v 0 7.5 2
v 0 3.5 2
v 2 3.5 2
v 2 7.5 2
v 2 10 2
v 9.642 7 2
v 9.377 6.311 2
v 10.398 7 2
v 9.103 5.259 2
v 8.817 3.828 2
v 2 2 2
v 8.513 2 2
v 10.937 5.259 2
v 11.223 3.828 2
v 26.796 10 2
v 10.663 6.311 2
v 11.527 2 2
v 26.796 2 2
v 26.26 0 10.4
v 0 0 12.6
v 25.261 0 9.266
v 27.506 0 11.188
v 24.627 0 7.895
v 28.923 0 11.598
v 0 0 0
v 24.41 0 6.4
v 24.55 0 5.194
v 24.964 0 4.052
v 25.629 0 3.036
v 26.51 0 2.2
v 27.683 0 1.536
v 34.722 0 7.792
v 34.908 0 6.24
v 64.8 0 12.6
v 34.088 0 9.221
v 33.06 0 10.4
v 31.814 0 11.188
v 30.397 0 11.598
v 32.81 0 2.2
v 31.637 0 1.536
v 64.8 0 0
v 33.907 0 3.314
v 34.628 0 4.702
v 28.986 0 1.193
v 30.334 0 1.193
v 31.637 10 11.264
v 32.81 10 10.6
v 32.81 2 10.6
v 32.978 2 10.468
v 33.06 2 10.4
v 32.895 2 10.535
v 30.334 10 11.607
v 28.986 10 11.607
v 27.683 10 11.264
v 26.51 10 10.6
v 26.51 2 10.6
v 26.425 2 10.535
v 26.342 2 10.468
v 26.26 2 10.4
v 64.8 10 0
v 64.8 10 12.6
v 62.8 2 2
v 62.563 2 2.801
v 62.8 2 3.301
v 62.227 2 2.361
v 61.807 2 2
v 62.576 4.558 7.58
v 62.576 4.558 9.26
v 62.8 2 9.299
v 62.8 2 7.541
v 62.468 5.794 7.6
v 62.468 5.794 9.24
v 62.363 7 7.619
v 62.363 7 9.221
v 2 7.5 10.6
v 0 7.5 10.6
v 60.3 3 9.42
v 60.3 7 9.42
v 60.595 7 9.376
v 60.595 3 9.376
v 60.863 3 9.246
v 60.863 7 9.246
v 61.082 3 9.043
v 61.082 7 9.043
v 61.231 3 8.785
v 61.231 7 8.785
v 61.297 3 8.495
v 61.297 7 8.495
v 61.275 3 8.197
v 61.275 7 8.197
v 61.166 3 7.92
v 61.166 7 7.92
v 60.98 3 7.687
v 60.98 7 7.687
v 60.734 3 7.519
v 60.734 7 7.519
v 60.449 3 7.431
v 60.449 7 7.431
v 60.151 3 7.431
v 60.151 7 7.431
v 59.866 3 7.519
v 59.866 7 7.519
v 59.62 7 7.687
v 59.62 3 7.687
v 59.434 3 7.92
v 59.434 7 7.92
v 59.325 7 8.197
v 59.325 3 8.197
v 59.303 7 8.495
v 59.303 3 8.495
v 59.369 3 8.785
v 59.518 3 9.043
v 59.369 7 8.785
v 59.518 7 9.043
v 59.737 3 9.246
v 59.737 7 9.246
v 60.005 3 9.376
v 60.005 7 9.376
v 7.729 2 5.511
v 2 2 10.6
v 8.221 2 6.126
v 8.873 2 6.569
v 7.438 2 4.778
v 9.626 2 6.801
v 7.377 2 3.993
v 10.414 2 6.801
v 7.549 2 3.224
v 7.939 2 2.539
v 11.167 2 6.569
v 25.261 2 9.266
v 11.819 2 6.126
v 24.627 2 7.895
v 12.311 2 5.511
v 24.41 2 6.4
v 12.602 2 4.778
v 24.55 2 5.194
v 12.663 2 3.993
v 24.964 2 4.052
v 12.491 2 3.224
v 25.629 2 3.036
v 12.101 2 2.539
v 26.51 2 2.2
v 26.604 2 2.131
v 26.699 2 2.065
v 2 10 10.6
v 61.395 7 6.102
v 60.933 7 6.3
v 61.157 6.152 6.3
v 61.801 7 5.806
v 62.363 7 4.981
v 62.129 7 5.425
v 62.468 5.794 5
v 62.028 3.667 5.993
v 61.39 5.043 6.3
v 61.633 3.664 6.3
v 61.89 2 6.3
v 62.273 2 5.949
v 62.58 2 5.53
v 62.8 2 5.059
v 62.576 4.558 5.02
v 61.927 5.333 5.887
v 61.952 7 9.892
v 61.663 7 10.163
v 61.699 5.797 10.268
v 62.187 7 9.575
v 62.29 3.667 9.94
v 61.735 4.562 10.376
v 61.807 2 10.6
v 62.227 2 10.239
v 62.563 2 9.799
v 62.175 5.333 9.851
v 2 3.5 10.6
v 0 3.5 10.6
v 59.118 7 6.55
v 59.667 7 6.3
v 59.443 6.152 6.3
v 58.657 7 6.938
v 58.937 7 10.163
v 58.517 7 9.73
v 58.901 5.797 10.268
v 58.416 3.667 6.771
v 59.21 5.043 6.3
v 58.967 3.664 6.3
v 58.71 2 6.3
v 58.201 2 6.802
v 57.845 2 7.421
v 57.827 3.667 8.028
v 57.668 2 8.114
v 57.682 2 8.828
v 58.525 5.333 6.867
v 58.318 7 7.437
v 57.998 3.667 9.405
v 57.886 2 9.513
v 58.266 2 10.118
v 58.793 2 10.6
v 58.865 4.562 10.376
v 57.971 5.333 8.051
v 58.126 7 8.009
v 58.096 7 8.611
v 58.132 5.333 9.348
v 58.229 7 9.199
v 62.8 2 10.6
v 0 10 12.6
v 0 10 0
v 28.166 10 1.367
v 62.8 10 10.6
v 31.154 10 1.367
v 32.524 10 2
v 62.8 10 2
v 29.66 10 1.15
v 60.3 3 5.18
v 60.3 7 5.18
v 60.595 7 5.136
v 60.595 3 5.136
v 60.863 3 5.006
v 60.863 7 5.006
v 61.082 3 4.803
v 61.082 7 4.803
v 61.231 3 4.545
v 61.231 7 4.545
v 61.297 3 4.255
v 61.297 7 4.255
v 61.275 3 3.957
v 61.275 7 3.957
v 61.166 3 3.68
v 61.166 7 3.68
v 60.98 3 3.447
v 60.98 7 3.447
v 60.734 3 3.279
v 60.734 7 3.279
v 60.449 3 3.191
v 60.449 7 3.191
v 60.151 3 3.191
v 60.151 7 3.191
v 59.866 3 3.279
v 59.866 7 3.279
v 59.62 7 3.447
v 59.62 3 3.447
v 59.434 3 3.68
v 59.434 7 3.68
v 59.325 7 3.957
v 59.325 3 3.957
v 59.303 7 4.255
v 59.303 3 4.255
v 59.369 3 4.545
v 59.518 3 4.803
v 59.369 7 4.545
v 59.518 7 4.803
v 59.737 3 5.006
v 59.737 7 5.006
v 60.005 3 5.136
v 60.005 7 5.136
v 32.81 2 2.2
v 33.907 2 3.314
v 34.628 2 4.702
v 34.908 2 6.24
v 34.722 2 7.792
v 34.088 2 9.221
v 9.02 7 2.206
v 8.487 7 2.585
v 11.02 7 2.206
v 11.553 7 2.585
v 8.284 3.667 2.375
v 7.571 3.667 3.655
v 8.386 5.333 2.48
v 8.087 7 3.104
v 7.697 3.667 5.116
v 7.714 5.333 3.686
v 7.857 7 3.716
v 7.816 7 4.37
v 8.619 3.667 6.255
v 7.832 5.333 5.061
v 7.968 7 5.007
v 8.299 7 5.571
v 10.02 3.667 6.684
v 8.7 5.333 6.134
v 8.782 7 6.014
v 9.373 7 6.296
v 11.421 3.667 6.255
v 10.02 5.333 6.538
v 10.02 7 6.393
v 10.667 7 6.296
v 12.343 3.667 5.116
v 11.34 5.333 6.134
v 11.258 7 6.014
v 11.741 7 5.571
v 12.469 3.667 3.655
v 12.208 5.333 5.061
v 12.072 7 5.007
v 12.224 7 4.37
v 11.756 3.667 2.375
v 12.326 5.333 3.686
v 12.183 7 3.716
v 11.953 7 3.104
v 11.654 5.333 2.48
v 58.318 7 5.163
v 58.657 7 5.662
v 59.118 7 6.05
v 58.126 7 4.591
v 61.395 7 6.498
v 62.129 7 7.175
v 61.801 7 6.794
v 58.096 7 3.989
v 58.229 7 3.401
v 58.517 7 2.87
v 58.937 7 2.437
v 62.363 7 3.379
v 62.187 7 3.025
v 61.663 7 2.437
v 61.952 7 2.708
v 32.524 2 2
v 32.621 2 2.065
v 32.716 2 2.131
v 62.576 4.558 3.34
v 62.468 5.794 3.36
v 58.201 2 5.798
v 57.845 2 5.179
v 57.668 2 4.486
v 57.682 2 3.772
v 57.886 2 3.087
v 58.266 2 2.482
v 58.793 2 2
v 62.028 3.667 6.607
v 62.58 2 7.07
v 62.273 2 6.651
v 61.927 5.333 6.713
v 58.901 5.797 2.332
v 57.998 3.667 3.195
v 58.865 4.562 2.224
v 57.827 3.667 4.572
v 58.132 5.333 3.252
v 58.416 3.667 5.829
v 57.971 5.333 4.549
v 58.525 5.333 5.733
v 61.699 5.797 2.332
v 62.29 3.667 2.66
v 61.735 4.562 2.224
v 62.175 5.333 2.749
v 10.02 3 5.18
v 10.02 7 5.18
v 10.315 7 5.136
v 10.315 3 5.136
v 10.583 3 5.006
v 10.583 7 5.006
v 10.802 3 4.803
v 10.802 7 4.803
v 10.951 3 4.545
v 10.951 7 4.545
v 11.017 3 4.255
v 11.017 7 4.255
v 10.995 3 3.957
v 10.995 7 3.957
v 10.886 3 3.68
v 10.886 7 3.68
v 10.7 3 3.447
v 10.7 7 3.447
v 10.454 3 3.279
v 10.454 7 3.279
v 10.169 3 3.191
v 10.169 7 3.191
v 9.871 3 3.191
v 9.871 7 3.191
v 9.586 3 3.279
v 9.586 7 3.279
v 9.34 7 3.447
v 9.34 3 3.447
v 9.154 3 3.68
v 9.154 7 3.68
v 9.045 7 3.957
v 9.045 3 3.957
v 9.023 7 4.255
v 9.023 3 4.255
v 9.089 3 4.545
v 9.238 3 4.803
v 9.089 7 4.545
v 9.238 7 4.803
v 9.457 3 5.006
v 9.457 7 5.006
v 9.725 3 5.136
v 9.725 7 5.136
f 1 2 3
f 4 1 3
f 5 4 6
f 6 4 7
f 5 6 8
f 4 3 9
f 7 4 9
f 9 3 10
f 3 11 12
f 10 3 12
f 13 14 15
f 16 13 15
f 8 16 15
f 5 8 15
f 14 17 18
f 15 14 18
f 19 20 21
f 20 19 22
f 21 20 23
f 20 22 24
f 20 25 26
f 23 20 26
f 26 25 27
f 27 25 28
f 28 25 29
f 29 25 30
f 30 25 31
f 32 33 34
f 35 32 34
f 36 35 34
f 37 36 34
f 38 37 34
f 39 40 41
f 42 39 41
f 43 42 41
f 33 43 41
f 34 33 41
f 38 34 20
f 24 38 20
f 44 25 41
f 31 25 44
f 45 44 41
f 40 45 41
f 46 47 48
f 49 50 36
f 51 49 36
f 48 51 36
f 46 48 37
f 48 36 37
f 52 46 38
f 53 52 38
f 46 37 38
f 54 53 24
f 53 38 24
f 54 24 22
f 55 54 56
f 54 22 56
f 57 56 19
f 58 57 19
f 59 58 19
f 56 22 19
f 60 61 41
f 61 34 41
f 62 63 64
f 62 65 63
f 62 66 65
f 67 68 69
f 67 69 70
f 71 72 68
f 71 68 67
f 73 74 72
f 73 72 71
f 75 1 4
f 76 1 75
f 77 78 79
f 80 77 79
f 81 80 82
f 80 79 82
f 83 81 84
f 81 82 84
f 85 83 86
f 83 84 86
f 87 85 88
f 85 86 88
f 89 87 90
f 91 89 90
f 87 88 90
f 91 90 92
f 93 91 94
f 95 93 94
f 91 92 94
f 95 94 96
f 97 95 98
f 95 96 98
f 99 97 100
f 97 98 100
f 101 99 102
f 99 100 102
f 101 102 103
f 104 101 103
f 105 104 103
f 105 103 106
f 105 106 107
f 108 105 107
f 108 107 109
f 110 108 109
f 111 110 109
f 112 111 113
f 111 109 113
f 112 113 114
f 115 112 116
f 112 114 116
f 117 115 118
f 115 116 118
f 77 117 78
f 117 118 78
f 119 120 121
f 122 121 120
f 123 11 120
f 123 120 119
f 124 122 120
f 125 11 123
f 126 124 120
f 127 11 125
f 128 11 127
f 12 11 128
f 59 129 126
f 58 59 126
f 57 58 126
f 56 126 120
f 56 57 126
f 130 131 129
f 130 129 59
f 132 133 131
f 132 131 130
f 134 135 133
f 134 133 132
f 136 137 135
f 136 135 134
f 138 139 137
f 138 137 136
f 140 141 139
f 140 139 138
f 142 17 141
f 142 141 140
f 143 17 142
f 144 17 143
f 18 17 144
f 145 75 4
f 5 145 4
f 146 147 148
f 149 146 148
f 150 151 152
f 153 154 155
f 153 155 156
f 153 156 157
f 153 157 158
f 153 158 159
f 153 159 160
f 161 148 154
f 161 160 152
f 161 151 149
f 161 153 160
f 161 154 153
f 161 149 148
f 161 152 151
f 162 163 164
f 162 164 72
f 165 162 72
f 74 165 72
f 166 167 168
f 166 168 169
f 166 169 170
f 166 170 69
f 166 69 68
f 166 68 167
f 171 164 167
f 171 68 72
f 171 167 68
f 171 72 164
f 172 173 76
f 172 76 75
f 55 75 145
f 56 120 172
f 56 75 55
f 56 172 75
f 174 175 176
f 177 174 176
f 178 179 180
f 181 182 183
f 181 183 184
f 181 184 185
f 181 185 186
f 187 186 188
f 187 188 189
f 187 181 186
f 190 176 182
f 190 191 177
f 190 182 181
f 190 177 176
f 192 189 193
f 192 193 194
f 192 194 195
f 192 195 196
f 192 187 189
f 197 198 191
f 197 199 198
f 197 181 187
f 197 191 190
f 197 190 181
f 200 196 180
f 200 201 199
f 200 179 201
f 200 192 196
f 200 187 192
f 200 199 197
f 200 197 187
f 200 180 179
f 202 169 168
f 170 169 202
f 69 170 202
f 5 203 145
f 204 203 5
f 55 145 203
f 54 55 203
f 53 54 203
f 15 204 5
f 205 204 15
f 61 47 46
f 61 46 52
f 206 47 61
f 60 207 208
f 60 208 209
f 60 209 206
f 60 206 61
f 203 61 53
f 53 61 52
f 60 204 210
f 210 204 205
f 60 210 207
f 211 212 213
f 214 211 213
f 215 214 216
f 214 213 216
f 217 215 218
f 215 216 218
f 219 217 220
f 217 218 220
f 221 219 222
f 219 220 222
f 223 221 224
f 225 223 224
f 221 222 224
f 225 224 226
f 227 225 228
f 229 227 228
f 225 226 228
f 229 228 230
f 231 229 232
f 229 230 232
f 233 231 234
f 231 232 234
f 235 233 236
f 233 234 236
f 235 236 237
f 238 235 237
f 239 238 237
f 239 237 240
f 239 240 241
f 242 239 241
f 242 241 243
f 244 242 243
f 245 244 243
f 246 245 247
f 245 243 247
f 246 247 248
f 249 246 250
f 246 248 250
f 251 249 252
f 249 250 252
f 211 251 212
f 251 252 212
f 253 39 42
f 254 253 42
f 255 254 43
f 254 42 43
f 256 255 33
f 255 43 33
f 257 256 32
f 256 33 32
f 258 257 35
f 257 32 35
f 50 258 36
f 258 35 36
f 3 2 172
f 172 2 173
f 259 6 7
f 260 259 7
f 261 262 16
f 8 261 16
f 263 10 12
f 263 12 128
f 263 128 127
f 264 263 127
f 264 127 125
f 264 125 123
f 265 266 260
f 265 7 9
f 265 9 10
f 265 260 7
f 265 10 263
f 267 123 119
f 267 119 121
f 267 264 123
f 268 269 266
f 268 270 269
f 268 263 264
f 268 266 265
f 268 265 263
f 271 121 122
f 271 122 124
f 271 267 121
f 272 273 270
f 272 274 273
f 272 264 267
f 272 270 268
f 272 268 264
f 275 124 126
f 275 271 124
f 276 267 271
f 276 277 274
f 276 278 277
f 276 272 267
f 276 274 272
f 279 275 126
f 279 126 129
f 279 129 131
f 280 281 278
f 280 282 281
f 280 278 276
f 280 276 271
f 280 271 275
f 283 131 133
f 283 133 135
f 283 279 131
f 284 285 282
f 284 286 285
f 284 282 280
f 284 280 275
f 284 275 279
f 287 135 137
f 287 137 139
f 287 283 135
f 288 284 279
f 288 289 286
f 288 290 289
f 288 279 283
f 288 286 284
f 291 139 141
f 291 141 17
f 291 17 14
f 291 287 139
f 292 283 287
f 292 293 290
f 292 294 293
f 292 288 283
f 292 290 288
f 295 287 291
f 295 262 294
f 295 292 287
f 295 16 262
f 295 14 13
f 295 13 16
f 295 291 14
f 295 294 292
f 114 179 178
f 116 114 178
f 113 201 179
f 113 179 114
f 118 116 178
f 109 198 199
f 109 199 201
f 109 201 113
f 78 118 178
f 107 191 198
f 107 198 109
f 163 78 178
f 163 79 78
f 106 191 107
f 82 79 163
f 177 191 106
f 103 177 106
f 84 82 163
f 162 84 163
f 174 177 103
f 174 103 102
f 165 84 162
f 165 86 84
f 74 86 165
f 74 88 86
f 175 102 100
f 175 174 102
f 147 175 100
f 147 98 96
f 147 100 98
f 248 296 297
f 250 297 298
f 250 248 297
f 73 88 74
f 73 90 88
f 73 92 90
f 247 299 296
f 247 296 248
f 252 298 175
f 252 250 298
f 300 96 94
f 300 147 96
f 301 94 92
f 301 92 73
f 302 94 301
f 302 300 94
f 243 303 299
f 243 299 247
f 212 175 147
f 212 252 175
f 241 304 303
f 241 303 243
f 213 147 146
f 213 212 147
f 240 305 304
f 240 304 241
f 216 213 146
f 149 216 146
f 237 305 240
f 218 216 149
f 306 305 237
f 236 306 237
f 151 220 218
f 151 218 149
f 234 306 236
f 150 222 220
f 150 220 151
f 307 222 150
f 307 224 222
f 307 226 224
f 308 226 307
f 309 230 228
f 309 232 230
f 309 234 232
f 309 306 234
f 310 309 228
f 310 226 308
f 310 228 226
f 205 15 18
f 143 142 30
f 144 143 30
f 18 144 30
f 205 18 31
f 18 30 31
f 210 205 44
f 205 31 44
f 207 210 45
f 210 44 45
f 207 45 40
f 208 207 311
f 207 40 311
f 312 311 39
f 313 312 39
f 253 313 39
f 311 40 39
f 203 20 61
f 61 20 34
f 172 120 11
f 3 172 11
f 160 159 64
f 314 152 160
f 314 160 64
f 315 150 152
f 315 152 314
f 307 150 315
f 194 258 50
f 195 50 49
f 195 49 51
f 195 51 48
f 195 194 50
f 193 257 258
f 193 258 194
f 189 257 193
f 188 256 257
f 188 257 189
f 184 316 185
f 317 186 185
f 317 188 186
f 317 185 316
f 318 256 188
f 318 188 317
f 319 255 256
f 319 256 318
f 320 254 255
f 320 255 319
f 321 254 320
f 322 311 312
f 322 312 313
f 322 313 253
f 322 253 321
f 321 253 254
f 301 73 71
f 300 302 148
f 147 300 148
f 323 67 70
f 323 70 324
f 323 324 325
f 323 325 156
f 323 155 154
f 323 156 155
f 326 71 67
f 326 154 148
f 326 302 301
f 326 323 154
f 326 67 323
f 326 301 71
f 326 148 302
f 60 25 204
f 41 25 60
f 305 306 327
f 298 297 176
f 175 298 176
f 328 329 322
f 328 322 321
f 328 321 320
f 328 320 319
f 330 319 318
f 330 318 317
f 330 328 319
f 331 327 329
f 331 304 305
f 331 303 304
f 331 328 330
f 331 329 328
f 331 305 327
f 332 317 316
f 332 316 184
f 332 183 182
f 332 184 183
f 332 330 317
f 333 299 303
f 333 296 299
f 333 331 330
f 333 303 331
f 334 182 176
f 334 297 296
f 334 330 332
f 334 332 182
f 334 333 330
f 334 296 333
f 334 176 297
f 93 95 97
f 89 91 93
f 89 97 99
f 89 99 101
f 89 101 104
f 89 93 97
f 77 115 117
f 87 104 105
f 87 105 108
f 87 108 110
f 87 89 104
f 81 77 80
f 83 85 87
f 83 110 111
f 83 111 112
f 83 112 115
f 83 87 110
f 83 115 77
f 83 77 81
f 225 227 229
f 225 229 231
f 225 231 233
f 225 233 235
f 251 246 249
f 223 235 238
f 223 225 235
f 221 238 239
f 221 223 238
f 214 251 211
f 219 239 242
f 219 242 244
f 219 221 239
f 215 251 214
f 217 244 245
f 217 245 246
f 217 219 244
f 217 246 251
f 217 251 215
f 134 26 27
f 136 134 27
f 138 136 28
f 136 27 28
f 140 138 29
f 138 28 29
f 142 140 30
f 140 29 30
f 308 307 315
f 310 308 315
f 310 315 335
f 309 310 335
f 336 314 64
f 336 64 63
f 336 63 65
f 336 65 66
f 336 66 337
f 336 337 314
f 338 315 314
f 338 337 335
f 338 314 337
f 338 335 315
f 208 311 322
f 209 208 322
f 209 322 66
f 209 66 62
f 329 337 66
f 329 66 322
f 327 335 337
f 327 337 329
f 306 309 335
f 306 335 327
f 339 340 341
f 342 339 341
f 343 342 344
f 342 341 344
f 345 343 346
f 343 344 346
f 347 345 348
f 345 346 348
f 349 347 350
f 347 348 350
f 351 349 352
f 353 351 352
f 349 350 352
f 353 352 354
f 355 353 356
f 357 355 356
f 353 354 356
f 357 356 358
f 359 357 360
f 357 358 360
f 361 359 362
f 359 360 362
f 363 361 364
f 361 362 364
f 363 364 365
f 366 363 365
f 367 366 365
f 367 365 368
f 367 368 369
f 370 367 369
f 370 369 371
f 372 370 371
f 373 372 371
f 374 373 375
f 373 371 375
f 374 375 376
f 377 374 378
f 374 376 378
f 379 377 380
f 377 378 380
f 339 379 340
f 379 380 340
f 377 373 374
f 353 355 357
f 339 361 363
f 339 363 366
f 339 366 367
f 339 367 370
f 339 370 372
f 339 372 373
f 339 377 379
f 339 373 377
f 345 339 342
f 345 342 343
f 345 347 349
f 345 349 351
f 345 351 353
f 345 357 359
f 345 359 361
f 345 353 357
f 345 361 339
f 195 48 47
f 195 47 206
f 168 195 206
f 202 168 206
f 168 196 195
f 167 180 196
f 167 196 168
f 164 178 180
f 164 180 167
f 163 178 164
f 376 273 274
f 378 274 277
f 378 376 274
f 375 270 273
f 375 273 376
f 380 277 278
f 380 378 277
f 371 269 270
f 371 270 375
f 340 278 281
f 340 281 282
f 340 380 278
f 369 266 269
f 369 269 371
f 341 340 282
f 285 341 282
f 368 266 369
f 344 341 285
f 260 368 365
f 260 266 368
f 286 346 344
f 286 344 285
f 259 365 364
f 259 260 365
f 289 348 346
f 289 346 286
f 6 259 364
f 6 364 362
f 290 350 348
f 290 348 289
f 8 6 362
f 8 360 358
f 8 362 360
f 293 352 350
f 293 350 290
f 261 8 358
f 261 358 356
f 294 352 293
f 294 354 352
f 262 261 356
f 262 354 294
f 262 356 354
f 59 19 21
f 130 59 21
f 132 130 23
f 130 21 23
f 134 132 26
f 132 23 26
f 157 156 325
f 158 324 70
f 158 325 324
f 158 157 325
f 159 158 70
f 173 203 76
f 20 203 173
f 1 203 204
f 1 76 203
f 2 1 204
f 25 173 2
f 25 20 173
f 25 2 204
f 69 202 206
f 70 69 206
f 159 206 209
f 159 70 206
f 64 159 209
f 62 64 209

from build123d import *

# Parameters (mm, degrees)
SKETCH1_W                     = 64.8
SKETCH1_H                     = 12.6
BOSS_EXTRUDE1_DEPTH           = 2
SKETCH2_W                     = 64.8
SKETCH2_H                     = 12.6
SKETCH2_W_2                   = 60.8
SKETCH2_H_2                   = 8.6
BOSS_EXTRUDE2_DEPTH           = 8
SKETCH3_R                     = 5.25
CUT_EXTRUDE1_DEPTH            = 67.766758196
BOSS_EXTRUDE3_DEPTH           = 5
BOSS_EXTRUDE3_DRAFT           = 5
SKETCH4_R                     = 2.65
BOSS_EXTRUDE3_PROFILE_2_DEPTH = 5
BOSS_EXTRUDE3_PROFILE_2_DRAFT = 5
SKETCH5_R                     = 1
CUT_EXTRUDE2_DEPTH            = 4
SKETCH6_W                     = 8.6
SKETCH6_H                     = 4
CUT_EXTRUDE3_DEPTH            = 3


with BuildPart() as part:
    # Sketch1 → Boss-Extrude1 (new body)
    with BuildSketch(Plane(origin=(0, 0, 0), x_dir=(1, 0, 0), z_dir=(0, 1, 0))):
        with Locations((32.4, -6.3)):
            Rectangle(SKETCH1_W, SKETCH1_H)
    extrude(amount=BOSS_EXTRUDE1_DEPTH)

    # Sketch2 → Boss-Extrude2 (add)
    with BuildSketch(Plane(origin=(0, 2, 0), x_dir=(1, 0, 0), z_dir=(0, 1, 0))):
        with Locations((32.4, -6.3)):
            Rectangle(SKETCH2_W, SKETCH2_H)
        with Locations((32.4, -6.3)):
            Rectangle(SKETCH2_W_2, SKETCH2_H_2, mode=Mode.SUBTRACT)
    extrude(amount=BOSS_EXTRUDE2_DEPTH)

    # Sketch3 → Cut-Extrude1 (cut, through all)
    with BuildSketch(Plane(origin=(0, 0, 0), x_dir=(-1, 0, 0), z_dir=(0, -1, 0))):
        with Locations((-29.66, -6.4)):
            Circle(SKETCH3_R)
    extrude(amount=-CUT_EXTRUDE1_DEPTH, mode=Mode.SUBTRACT)


with BuildPart() as boss_extrude3_tool:
    # Sketch4 → Boss-Extrude3 (with draft: the straight prism first)
    with BuildSketch(Plane(origin=(0, 2, 0), x_dir=(1, 0, 0), z_dir=(0, 1, 0))):
        with BuildLine():
            Line((62.8, -5.058919792), (62.8, -3.301080208))
            ThreePointArc((62.8, -3.301080208), (62.406319968, -2.571921583), (61.806685103, -2))
            Line((61.806685103, -2), (58.793314897, -2))
            ThreePointArc((58.793314897, -2), (57.650497281, -4.128664408), (58.71, -6.3))
            ThreePointArc((58.71, -6.3), (57.650497281, -8.471335592), (58.793314897, -10.6))
            Line((58.793314897, -10.6), (61.806685103, -10.6))
            ThreePointArc((61.806685103, -10.6), (62.406319968, -10.028078417), (62.8, -9.298919792))
            Line((62.8, -9.298919792), (62.8, -7.541080208))
            ThreePointArc((62.8, -7.541080208), (62.437076279, -6.85302681), (61.89, -6.3))
            ThreePointArc((61.89, -6.3), (62.437076279, -5.74697319), (62.8, -5.058919792))
        make_face()
    extrude(amount=BOSS_EXTRUDE3_DEPTH)
    # Boss-Extrude3: the draft: its side faces are tilted about the plane it starts from
    boss_extrude3_sides = [boss_extrude3_tool.faces().sort_by_distance(p)[0] for p in [
        (60.3, 4.5, 10.6),
        (62.406319968, 4.5, 10.028078417),
        (62.8, 4.5, 8.42),
        (62.437076279, 4.5, 6.85302681),
        (62.437076279, 4.5, 5.74697319),
        (62.8, 4.5, 4.18),
        (62.406319968, 4.5, 2.571921583),
        (60.3, 4.5, 2),
        (57.650497281, 4.5, 4.128664408),
        (57.650497281, 4.5, 8.471335592),
    ]]
    draft(boss_extrude3_sides, Plane(origin=(0, 2, 0), x_dir=(1, 0, 0), z_dir=(0, 1, 0)), BOSS_EXTRUDE3_DRAFT)


with BuildPart() as part_1:
    add(part.part)

    # Boss-Extrude3: add boss_extrude3_tool
    add(boss_extrude3_tool.part)


with BuildPart() as boss_extrude3_profile_2_tool:
    # Sketch4 → Boss-Extrude3 profile 2 (with draft: the straight prism first)
    with BuildSketch(Plane(origin=(0, 2, 0), x_dir=(1, 0, 0), z_dir=(0, 1, 0))):
        with Locations((10.02, -4.18)):
            Circle(SKETCH4_R)
    extrude(amount=BOSS_EXTRUDE3_PROFILE_2_DEPTH)
    # Boss-Extrude3 profile 2: the draft: its side faces are tilted about the plane it starts from
    boss_extrude3_profile_2_sides = [boss_extrude3_profile_2_tool.faces().sort_by_distance(p)[0] for p in [
        (7.37, 4.5, 4.18),
    ]]
    draft(boss_extrude3_profile_2_sides, Plane(origin=(0, 2, 0), x_dir=(1, 0, 0), z_dir=(0, 1, 0)), BOSS_EXTRUDE3_PROFILE_2_DRAFT)


with BuildPart() as part_2:
    add(part_1.part)

    # Boss-Extrude3 profile 2: add boss_extrude3_profile_2_tool
    add(boss_extrude3_profile_2_tool.part)

    # Sketch5 → Cut-Extrude2 (cut)
    with BuildSketch(Plane(origin=(0, 7, 0), x_dir=(1, 0, 0), z_dir=(0, 1, 0))):
        with Locations((60.3, -8.42)):
            Circle(SKETCH5_R)
        with Locations((10.02, -4.18)):
            Circle(SKETCH5_R)
        with Locations((60.3, -4.18)):
            Circle(SKETCH5_R)
    extrude(amount=-CUT_EXTRUDE2_DEPTH, mode=Mode.SUBTRACT)

    # Sketch6 → Cut-Extrude3 (cut)
    with BuildSketch(Plane.ZY):
        with Locations((6.3, 5.5)):
            Rectangle(SKETCH6_W, SKETCH6_H)
    extrude(amount=-CUT_EXTRUDE3_DEPTH, mode=Mode.SUBTRACT)


solid = part_2.part
